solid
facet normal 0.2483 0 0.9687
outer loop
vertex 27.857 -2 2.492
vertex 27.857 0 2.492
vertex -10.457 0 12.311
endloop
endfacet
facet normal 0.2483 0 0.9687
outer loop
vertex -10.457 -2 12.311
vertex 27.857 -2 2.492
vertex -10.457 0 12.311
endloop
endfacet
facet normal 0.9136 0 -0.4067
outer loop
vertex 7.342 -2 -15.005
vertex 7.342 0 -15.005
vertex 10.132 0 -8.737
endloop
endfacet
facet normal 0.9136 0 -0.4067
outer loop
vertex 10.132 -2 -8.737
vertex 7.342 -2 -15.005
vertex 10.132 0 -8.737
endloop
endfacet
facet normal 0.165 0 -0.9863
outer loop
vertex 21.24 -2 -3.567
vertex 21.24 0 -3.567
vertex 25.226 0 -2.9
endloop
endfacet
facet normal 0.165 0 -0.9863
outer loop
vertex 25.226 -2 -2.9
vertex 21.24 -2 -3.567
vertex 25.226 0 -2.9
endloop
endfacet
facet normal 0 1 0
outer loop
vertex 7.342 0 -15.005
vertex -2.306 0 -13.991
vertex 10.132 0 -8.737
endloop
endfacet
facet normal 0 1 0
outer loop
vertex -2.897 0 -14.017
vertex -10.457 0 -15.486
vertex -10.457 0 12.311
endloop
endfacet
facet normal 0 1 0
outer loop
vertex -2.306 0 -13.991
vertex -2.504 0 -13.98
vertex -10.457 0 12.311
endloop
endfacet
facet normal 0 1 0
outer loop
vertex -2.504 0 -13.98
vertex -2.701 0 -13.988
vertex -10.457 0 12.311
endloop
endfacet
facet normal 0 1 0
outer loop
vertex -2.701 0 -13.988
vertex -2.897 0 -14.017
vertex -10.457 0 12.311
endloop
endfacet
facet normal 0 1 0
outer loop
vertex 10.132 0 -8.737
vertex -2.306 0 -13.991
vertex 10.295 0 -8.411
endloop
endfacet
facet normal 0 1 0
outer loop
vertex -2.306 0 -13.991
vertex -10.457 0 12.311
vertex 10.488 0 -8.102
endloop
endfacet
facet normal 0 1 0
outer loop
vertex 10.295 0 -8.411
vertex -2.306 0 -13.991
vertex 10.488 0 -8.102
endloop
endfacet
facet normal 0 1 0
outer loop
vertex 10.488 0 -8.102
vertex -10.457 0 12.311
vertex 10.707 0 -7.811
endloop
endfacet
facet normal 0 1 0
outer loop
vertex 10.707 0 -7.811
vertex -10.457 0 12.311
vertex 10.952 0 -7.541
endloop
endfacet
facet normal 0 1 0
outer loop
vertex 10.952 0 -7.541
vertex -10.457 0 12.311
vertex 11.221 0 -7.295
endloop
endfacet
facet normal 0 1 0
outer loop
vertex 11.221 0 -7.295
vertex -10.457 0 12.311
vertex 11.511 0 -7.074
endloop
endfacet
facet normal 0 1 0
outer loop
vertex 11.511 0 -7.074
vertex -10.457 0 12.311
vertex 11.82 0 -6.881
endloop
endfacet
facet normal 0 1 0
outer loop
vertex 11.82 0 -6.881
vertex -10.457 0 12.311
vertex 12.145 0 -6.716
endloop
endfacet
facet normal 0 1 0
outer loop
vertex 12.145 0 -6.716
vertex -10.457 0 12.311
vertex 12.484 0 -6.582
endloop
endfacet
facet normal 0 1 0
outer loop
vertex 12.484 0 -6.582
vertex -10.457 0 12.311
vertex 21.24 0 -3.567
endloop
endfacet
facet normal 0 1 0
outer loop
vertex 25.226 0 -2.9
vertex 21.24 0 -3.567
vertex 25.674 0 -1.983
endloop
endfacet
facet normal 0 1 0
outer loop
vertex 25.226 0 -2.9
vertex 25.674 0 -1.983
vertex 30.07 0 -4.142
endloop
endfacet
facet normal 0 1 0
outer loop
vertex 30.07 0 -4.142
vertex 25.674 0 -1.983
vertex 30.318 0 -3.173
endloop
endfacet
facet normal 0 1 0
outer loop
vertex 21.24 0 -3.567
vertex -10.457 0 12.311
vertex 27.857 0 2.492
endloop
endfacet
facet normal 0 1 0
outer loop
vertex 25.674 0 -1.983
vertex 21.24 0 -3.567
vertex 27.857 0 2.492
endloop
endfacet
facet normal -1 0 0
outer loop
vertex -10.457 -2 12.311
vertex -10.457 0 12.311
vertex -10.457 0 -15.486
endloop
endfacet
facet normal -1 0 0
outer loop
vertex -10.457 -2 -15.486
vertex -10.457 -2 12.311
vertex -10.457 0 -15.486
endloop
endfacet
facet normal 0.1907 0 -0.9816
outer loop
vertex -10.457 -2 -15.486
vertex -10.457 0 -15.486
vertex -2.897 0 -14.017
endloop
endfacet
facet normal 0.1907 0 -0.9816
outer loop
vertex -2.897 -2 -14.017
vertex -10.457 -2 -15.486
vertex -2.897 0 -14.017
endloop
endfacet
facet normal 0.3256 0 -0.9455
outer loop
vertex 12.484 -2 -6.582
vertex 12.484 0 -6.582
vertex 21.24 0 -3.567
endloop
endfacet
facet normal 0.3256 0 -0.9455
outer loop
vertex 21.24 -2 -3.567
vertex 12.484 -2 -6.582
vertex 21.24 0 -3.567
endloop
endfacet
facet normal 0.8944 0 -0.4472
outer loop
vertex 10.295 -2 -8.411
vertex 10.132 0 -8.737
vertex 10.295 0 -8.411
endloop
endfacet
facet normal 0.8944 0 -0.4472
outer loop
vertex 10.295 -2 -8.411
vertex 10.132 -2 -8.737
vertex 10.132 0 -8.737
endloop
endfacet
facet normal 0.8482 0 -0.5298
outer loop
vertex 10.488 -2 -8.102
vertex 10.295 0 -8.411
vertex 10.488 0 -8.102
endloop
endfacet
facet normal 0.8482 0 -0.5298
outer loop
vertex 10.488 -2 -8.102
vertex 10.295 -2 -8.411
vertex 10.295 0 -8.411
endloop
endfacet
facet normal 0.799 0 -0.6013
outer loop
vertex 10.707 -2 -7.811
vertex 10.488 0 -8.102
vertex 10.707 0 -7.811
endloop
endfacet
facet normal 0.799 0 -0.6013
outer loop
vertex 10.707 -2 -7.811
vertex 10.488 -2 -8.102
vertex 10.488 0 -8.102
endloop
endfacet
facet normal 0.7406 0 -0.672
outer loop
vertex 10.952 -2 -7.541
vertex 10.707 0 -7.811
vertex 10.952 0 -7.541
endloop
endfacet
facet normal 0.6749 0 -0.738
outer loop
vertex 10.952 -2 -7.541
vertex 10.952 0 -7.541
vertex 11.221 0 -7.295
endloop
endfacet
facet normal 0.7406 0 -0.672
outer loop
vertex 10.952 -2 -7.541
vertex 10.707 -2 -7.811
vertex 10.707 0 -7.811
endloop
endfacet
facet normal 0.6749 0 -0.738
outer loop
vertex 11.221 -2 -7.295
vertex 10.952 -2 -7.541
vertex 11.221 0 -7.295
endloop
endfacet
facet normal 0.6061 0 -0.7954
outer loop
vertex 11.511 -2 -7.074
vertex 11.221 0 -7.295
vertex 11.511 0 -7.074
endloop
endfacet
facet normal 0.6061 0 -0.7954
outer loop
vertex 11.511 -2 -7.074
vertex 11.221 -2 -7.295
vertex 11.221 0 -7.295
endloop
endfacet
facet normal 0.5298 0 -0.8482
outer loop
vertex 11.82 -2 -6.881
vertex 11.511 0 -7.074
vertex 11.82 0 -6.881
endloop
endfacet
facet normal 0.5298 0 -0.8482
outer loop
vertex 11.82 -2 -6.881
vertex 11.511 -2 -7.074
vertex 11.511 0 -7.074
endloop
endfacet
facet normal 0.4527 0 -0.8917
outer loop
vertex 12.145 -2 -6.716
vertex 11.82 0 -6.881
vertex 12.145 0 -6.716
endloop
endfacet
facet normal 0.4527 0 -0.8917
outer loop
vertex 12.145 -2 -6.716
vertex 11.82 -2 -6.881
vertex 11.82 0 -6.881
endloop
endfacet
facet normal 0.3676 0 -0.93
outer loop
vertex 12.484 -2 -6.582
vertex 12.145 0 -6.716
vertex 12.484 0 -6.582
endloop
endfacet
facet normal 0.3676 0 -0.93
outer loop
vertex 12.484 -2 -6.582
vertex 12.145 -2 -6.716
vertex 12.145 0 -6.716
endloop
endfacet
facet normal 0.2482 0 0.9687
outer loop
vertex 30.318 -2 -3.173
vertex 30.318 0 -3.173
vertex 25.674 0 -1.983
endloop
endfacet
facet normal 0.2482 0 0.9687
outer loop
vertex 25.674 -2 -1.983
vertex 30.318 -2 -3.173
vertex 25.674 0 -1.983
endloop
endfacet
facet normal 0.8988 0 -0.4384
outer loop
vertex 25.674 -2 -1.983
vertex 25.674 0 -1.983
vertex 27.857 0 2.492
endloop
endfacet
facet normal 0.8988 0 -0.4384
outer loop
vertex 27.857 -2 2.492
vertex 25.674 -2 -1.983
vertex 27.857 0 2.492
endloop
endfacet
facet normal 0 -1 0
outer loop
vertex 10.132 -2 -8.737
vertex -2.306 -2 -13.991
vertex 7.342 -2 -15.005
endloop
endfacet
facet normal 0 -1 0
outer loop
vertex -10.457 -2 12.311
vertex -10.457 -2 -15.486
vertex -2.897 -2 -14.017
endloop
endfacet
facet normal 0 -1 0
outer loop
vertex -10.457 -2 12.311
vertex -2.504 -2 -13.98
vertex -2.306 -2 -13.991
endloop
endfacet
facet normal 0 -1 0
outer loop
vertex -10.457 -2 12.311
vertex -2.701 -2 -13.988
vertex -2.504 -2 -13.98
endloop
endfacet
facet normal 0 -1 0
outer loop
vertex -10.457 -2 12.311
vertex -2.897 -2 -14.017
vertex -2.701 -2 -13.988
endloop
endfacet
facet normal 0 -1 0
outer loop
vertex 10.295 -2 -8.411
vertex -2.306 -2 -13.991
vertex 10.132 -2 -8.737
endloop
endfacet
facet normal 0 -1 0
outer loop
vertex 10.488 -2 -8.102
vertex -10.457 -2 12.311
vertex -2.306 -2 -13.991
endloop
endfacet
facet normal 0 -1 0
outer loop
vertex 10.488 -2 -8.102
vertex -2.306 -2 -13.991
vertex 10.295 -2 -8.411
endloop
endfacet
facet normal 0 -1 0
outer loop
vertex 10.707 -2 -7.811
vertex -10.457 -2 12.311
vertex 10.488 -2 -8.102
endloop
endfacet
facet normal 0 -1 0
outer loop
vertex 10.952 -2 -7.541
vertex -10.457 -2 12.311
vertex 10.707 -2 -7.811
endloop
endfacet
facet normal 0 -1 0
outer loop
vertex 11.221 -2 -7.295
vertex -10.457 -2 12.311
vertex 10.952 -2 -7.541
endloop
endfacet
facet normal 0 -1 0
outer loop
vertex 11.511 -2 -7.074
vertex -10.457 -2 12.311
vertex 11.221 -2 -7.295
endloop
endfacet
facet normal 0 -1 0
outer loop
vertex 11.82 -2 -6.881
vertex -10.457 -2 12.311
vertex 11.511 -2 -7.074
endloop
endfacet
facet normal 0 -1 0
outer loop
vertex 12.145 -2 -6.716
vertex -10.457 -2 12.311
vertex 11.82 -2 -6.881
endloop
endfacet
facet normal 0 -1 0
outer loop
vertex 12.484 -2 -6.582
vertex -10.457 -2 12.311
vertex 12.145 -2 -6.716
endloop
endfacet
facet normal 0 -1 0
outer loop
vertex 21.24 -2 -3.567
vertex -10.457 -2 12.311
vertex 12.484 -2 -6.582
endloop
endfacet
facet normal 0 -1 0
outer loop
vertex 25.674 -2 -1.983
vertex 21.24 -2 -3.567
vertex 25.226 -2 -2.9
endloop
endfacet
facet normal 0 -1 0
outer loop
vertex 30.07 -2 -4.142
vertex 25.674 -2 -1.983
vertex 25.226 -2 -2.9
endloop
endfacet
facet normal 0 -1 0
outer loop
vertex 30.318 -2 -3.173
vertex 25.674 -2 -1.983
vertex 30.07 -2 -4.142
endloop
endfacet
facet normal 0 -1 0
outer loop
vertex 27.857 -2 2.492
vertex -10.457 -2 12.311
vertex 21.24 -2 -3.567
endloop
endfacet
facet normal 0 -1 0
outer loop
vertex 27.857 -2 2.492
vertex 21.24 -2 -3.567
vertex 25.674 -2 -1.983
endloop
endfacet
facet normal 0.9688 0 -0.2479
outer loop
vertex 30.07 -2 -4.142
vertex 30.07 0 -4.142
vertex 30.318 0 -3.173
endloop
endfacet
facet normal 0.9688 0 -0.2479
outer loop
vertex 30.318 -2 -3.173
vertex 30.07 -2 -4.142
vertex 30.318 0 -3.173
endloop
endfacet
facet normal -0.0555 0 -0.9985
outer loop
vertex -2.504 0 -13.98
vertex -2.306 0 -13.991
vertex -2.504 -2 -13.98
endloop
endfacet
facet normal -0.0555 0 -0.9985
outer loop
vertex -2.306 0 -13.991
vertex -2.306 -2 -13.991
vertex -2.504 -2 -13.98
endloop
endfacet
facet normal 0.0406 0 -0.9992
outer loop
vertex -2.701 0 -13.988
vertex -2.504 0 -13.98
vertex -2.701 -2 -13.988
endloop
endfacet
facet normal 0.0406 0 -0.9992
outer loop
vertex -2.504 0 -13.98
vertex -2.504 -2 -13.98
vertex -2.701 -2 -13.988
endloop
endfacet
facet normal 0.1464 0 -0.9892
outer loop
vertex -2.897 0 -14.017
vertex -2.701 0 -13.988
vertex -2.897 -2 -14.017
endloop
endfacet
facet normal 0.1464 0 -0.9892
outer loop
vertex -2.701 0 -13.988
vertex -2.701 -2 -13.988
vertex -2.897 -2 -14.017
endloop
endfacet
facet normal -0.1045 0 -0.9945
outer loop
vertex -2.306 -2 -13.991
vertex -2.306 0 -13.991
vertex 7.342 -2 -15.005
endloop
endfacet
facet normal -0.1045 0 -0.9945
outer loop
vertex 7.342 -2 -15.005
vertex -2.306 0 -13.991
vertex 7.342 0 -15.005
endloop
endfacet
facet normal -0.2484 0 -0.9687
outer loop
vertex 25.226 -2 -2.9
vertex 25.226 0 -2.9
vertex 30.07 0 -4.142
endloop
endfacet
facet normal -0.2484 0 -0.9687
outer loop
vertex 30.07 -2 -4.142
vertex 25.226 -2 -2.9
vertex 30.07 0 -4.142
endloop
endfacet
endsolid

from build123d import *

# Parameters (mm, degrees)
F1_DEPTH = 2
F2_R     = 4
F3_R     = 2


with BuildPart() as f1:
    # F0 (on Front) → F1 (new body)
    with BuildSketch(Plane.XZ):
        Polygon((-10.456731, 12.310552), (-10.456731, -15.486014), (-2.603713, -13.959542), (7.341506, -15.004827), (10.839441, -7.148336), (21.240145, -3.567086), (25.226323, -2.90037), (30.069817, -4.141563), (30.318056, -3.172864), (25.673877, -1.982748), (27.85655, 2.492394), align=None)
    extrude(amount=F1_DEPTH)

    # F2
    f2_edges = [f1.edges().sort_by_distance(p)[0] for p in [
        (10.839441, -1, -7.148336),
    ]]
    fillet(f2_edges, radius=F2_R)

    # F3
    f3_edges = [f1.edges().sort_by_distance(p)[0] for p in [
        (-2.603713, -1, -13.959542),
    ]]
    fillet(f3_edges, radius=F3_R)


solid = f1.part
